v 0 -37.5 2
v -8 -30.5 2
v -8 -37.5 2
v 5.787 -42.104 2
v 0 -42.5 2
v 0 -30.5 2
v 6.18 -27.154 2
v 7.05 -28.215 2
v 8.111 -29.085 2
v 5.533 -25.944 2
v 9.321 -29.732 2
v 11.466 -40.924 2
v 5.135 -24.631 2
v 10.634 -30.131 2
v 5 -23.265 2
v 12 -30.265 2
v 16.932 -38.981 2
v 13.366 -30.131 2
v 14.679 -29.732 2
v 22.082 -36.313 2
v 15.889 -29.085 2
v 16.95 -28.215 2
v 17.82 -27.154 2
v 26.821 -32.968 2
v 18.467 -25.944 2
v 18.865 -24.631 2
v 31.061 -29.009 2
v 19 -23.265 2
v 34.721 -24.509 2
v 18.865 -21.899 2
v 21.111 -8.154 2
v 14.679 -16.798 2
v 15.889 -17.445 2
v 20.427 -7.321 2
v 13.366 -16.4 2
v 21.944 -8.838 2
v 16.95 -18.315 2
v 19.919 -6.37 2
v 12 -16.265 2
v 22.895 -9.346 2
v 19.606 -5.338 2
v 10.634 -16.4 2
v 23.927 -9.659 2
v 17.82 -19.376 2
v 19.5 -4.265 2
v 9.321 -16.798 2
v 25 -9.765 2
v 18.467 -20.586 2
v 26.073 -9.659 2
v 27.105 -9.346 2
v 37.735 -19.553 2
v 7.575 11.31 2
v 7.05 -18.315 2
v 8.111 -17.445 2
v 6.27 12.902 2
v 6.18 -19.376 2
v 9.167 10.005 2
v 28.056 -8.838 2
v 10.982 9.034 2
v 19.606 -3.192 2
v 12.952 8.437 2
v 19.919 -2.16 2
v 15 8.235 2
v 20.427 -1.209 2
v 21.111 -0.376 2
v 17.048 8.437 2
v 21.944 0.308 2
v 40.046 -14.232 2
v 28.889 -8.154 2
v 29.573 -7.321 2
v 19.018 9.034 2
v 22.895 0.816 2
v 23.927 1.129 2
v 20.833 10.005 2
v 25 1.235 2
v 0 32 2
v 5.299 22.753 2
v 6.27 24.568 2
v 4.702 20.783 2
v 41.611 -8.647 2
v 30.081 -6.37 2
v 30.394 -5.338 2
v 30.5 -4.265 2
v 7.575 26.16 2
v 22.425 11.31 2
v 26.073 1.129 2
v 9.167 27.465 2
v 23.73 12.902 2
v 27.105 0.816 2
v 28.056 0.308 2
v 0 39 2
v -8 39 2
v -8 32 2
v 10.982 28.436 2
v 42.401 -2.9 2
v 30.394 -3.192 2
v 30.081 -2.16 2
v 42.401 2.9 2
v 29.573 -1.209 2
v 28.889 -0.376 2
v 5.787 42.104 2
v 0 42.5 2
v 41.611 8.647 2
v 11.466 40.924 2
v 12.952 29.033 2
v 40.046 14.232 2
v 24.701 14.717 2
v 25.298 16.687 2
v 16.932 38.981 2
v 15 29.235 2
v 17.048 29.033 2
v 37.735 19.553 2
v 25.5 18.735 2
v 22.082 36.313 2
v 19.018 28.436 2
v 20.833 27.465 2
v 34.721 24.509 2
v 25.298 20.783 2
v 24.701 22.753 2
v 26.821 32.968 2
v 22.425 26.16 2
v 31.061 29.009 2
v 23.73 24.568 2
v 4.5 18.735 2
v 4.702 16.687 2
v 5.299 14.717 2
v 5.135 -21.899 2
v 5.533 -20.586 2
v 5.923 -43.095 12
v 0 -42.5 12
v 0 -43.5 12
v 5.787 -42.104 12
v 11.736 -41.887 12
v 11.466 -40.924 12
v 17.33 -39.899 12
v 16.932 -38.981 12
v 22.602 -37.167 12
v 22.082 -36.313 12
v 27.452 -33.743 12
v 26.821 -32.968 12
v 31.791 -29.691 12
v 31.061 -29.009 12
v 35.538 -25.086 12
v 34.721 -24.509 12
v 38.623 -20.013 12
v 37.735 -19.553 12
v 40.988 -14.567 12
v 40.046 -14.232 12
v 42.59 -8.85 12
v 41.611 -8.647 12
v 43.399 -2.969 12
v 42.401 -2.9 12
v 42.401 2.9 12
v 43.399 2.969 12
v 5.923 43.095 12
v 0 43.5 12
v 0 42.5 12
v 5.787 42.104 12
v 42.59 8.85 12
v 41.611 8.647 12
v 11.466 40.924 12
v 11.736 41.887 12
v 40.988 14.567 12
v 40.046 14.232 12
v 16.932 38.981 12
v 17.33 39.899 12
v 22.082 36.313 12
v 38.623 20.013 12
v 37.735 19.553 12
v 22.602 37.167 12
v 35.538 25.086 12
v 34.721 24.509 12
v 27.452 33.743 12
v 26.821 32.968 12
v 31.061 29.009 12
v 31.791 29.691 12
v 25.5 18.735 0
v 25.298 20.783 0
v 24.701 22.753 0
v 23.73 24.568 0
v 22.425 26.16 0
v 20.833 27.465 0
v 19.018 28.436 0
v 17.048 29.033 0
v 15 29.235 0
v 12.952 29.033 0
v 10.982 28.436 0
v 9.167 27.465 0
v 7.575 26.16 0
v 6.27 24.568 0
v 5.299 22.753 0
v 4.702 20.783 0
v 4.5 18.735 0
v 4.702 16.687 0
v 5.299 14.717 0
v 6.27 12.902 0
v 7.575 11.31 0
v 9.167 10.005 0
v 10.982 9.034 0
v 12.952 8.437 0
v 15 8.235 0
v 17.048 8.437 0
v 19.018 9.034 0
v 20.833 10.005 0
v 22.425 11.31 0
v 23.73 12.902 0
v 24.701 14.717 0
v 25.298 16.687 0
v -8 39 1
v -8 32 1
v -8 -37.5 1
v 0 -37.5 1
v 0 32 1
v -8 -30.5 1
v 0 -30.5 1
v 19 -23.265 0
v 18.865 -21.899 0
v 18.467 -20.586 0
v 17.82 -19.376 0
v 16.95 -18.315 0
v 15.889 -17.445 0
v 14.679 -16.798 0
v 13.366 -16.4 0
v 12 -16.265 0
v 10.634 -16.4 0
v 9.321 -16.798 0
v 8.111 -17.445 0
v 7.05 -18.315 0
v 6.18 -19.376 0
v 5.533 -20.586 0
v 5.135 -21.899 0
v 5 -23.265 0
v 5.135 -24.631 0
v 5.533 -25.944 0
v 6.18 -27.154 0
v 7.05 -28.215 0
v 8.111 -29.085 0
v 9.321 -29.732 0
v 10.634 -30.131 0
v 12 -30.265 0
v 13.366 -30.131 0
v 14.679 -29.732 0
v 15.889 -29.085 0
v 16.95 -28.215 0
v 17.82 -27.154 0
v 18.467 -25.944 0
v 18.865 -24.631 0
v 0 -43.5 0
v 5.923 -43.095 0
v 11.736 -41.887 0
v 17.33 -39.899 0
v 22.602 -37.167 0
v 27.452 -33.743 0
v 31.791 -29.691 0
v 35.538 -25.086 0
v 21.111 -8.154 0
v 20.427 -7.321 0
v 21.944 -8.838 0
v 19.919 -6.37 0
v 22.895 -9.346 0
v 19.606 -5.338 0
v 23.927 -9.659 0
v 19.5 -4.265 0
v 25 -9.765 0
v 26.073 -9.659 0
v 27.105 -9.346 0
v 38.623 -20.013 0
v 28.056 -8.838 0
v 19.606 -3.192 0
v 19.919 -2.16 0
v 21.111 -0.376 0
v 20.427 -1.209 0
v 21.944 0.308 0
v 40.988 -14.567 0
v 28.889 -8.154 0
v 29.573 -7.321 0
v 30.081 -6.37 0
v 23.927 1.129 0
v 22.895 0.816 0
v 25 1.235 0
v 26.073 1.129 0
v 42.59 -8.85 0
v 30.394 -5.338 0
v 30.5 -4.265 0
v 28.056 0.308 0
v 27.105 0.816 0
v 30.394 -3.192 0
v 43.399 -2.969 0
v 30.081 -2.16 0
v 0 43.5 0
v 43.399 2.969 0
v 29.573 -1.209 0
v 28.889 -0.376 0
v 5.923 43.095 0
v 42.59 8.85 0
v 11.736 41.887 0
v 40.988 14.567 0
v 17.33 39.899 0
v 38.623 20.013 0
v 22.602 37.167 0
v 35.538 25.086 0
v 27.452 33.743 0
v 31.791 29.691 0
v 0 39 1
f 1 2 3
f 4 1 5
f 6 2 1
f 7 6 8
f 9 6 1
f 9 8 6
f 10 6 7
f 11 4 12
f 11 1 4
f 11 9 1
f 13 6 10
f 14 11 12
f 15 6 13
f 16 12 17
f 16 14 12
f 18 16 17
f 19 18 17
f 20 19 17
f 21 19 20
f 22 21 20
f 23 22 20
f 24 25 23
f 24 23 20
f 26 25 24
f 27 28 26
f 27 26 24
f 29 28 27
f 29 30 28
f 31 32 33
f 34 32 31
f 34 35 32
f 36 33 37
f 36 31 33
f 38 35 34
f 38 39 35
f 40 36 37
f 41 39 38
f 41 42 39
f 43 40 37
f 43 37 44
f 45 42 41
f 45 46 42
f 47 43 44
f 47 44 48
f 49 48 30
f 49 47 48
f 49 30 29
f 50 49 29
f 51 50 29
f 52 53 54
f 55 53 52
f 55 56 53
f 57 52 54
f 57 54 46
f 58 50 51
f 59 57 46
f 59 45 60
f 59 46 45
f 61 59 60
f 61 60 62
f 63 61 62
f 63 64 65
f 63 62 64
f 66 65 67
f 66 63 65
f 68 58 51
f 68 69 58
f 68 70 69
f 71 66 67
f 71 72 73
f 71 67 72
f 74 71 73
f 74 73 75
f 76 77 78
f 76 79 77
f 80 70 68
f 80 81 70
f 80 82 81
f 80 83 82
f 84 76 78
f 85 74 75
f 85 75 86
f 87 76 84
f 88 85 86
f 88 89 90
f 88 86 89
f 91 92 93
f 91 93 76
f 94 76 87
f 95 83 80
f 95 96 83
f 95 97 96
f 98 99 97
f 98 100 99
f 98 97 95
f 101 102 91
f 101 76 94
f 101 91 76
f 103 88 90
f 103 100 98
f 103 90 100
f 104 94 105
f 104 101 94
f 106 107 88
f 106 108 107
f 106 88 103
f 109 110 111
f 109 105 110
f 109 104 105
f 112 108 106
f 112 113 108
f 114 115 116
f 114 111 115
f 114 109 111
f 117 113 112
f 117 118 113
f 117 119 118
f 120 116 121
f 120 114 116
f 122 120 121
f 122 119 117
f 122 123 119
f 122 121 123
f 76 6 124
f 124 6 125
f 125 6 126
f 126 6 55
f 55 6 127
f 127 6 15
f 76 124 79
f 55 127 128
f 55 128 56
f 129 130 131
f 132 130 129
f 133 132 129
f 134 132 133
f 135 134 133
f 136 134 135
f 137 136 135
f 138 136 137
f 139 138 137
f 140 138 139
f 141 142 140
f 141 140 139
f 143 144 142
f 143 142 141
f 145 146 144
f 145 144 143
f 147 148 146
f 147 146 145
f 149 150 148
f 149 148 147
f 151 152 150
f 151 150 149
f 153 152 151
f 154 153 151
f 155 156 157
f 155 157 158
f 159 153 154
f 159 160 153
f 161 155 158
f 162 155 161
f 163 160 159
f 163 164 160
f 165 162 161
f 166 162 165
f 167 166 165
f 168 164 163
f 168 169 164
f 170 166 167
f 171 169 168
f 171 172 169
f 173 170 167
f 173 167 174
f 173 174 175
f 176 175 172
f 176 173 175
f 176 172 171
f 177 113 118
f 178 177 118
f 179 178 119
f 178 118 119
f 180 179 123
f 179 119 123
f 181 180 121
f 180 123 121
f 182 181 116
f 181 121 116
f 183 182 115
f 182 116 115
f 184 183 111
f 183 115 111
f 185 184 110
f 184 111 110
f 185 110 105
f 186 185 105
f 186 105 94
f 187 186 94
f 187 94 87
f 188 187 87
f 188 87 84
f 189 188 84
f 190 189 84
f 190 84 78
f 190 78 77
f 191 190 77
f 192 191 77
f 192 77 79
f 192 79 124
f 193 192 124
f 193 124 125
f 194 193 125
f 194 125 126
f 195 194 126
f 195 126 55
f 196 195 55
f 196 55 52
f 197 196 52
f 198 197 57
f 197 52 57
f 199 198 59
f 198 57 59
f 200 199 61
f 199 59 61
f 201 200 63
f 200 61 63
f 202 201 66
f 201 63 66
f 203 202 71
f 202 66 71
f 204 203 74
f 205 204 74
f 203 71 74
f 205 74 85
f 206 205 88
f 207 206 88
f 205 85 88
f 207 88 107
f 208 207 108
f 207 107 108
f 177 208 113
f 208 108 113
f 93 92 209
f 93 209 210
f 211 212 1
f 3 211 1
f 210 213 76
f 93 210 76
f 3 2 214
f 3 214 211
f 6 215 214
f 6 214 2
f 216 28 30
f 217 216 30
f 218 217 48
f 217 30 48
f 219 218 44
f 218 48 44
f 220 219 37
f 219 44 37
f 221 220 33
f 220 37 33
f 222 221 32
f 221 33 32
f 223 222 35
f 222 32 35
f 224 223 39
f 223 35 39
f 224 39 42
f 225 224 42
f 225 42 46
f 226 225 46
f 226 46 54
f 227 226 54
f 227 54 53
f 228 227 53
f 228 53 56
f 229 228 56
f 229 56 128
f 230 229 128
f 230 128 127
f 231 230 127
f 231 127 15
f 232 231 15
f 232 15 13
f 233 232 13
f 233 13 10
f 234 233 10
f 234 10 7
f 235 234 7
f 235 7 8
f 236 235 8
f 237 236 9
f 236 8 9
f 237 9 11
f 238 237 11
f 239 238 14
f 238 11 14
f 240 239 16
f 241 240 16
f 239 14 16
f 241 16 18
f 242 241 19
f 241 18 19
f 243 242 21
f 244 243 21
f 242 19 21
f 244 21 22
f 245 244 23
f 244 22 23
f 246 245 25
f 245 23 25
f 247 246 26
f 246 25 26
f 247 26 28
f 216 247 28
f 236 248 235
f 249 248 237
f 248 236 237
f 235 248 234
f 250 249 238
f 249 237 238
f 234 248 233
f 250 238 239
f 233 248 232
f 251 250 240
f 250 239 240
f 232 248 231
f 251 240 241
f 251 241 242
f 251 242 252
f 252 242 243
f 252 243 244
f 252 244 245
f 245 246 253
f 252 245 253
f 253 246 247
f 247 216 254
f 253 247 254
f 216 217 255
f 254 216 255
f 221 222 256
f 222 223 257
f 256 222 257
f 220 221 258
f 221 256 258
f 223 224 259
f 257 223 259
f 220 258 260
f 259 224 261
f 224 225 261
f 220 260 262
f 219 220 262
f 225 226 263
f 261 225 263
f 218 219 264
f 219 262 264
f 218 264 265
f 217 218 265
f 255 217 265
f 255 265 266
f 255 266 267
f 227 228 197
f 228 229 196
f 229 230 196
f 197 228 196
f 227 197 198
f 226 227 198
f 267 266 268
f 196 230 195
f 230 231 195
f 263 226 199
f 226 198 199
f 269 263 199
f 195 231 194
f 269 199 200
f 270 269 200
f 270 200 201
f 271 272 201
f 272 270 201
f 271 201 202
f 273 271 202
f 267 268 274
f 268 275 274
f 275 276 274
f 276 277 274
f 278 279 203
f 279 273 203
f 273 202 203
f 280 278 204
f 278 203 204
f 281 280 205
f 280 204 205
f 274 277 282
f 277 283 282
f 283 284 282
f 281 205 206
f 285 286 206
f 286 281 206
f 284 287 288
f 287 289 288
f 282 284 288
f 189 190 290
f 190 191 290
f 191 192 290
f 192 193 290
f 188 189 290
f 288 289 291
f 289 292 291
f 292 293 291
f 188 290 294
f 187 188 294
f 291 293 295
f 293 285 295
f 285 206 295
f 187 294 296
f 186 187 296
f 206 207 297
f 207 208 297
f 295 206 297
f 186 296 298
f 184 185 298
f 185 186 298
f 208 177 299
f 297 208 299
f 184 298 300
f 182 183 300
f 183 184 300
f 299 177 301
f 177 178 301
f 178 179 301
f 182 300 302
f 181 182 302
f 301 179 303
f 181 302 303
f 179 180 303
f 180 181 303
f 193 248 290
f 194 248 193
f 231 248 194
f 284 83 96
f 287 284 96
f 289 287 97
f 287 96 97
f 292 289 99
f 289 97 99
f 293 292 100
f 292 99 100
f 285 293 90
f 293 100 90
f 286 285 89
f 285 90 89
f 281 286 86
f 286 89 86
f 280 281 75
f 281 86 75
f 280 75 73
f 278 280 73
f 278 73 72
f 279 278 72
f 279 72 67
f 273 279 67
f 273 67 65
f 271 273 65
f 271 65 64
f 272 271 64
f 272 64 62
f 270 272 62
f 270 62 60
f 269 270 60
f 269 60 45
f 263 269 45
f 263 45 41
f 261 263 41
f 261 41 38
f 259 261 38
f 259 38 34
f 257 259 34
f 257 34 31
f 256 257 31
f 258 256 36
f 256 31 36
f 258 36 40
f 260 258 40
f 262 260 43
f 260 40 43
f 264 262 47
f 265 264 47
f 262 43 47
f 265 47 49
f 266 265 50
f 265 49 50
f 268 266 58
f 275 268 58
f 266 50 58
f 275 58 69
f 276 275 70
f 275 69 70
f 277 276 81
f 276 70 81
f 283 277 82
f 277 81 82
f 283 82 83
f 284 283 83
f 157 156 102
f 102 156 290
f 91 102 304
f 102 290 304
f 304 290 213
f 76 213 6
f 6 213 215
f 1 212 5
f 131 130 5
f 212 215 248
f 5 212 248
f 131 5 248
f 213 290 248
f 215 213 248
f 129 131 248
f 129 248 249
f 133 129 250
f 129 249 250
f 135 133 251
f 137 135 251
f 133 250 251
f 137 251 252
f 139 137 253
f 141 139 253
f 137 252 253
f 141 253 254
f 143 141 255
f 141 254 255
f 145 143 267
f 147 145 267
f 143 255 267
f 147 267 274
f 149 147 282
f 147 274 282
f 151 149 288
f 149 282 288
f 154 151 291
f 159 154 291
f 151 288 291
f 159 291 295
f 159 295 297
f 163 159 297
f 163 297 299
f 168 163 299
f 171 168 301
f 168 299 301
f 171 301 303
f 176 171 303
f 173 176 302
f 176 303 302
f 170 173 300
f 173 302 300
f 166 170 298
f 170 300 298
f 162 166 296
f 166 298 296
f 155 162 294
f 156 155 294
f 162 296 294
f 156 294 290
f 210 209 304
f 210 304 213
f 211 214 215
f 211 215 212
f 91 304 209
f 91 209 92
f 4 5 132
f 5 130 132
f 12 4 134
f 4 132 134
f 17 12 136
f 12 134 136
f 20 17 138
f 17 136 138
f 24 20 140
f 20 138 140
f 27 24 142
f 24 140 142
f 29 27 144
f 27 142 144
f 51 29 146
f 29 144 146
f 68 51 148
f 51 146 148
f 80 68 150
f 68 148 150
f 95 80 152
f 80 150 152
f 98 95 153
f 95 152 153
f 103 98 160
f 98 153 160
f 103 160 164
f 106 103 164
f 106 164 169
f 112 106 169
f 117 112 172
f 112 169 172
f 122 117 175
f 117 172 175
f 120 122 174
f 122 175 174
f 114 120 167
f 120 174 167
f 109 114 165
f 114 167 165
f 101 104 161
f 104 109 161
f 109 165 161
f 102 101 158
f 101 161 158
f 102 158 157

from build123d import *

# Parameters (mm, degrees)
F1_DEPTH = 12
F2_R     = 42.5
F3_DEPTH = 10
F4_R     = 10.5
F4_R_2   = 5.5
F4_R_3   = 7
F5_DEPTH = 2.001
F6_W     = 7
F6_H     = 1
F7_DEPTH = 8


with BuildPart() as f1:
    # F0 (on Top) → F1 (new body)
    with BuildSketch(Plane.XY):
        with BuildLine():
            Line((0, 43.5), (0, -43.5))
            ThreePointArc((0, -43.5), (43.5, 0), (0, 43.5))
        make_face()
    extrude(amount=F1_DEPTH)

    # F2 (on face) → F3 (cut)
    with BuildSketch(Plane.XY.offset(12)):
        Circle(F2_R)
    extrude(amount=-F3_DEPTH, mode=Mode.SUBTRACT)

    # F4 (on face) → F5 (cut, through all)
    with BuildSketch(Plane.XY.offset(2)):
        with Locations((-15, 18.734994)):
            Circle(F4_R)
        with Locations((-25, -4.265006)):
            Circle(F4_R_2)
        with Locations((-12, -23.265006)):
            Circle(F4_R_3)
        with Locations((15, 18.734994)):
            Circle(F4_R)
        with Locations((25, -4.265006)):
            Circle(F4_R_2)
        with Locations((12, -23.265006)):
            Circle(F4_R_3)
    extrude(amount=-F5_DEPTH, mode=Mode.SUBTRACT)

    # F6 (on face) → F7 (join)
    with BuildSketch(Plane(origin=(0, 0, 0), x_dir=(0, -1, 0), z_dir=(-1, 0, 0))):
        with Locations((-35.5, 1.5)):
            Rectangle(F6_W, F6_H)
        with Locations((34, 1.5)):
            Rectangle(F6_W, F6_H)
    extrude(amount=F7_DEPTH)


solid = f1.part
